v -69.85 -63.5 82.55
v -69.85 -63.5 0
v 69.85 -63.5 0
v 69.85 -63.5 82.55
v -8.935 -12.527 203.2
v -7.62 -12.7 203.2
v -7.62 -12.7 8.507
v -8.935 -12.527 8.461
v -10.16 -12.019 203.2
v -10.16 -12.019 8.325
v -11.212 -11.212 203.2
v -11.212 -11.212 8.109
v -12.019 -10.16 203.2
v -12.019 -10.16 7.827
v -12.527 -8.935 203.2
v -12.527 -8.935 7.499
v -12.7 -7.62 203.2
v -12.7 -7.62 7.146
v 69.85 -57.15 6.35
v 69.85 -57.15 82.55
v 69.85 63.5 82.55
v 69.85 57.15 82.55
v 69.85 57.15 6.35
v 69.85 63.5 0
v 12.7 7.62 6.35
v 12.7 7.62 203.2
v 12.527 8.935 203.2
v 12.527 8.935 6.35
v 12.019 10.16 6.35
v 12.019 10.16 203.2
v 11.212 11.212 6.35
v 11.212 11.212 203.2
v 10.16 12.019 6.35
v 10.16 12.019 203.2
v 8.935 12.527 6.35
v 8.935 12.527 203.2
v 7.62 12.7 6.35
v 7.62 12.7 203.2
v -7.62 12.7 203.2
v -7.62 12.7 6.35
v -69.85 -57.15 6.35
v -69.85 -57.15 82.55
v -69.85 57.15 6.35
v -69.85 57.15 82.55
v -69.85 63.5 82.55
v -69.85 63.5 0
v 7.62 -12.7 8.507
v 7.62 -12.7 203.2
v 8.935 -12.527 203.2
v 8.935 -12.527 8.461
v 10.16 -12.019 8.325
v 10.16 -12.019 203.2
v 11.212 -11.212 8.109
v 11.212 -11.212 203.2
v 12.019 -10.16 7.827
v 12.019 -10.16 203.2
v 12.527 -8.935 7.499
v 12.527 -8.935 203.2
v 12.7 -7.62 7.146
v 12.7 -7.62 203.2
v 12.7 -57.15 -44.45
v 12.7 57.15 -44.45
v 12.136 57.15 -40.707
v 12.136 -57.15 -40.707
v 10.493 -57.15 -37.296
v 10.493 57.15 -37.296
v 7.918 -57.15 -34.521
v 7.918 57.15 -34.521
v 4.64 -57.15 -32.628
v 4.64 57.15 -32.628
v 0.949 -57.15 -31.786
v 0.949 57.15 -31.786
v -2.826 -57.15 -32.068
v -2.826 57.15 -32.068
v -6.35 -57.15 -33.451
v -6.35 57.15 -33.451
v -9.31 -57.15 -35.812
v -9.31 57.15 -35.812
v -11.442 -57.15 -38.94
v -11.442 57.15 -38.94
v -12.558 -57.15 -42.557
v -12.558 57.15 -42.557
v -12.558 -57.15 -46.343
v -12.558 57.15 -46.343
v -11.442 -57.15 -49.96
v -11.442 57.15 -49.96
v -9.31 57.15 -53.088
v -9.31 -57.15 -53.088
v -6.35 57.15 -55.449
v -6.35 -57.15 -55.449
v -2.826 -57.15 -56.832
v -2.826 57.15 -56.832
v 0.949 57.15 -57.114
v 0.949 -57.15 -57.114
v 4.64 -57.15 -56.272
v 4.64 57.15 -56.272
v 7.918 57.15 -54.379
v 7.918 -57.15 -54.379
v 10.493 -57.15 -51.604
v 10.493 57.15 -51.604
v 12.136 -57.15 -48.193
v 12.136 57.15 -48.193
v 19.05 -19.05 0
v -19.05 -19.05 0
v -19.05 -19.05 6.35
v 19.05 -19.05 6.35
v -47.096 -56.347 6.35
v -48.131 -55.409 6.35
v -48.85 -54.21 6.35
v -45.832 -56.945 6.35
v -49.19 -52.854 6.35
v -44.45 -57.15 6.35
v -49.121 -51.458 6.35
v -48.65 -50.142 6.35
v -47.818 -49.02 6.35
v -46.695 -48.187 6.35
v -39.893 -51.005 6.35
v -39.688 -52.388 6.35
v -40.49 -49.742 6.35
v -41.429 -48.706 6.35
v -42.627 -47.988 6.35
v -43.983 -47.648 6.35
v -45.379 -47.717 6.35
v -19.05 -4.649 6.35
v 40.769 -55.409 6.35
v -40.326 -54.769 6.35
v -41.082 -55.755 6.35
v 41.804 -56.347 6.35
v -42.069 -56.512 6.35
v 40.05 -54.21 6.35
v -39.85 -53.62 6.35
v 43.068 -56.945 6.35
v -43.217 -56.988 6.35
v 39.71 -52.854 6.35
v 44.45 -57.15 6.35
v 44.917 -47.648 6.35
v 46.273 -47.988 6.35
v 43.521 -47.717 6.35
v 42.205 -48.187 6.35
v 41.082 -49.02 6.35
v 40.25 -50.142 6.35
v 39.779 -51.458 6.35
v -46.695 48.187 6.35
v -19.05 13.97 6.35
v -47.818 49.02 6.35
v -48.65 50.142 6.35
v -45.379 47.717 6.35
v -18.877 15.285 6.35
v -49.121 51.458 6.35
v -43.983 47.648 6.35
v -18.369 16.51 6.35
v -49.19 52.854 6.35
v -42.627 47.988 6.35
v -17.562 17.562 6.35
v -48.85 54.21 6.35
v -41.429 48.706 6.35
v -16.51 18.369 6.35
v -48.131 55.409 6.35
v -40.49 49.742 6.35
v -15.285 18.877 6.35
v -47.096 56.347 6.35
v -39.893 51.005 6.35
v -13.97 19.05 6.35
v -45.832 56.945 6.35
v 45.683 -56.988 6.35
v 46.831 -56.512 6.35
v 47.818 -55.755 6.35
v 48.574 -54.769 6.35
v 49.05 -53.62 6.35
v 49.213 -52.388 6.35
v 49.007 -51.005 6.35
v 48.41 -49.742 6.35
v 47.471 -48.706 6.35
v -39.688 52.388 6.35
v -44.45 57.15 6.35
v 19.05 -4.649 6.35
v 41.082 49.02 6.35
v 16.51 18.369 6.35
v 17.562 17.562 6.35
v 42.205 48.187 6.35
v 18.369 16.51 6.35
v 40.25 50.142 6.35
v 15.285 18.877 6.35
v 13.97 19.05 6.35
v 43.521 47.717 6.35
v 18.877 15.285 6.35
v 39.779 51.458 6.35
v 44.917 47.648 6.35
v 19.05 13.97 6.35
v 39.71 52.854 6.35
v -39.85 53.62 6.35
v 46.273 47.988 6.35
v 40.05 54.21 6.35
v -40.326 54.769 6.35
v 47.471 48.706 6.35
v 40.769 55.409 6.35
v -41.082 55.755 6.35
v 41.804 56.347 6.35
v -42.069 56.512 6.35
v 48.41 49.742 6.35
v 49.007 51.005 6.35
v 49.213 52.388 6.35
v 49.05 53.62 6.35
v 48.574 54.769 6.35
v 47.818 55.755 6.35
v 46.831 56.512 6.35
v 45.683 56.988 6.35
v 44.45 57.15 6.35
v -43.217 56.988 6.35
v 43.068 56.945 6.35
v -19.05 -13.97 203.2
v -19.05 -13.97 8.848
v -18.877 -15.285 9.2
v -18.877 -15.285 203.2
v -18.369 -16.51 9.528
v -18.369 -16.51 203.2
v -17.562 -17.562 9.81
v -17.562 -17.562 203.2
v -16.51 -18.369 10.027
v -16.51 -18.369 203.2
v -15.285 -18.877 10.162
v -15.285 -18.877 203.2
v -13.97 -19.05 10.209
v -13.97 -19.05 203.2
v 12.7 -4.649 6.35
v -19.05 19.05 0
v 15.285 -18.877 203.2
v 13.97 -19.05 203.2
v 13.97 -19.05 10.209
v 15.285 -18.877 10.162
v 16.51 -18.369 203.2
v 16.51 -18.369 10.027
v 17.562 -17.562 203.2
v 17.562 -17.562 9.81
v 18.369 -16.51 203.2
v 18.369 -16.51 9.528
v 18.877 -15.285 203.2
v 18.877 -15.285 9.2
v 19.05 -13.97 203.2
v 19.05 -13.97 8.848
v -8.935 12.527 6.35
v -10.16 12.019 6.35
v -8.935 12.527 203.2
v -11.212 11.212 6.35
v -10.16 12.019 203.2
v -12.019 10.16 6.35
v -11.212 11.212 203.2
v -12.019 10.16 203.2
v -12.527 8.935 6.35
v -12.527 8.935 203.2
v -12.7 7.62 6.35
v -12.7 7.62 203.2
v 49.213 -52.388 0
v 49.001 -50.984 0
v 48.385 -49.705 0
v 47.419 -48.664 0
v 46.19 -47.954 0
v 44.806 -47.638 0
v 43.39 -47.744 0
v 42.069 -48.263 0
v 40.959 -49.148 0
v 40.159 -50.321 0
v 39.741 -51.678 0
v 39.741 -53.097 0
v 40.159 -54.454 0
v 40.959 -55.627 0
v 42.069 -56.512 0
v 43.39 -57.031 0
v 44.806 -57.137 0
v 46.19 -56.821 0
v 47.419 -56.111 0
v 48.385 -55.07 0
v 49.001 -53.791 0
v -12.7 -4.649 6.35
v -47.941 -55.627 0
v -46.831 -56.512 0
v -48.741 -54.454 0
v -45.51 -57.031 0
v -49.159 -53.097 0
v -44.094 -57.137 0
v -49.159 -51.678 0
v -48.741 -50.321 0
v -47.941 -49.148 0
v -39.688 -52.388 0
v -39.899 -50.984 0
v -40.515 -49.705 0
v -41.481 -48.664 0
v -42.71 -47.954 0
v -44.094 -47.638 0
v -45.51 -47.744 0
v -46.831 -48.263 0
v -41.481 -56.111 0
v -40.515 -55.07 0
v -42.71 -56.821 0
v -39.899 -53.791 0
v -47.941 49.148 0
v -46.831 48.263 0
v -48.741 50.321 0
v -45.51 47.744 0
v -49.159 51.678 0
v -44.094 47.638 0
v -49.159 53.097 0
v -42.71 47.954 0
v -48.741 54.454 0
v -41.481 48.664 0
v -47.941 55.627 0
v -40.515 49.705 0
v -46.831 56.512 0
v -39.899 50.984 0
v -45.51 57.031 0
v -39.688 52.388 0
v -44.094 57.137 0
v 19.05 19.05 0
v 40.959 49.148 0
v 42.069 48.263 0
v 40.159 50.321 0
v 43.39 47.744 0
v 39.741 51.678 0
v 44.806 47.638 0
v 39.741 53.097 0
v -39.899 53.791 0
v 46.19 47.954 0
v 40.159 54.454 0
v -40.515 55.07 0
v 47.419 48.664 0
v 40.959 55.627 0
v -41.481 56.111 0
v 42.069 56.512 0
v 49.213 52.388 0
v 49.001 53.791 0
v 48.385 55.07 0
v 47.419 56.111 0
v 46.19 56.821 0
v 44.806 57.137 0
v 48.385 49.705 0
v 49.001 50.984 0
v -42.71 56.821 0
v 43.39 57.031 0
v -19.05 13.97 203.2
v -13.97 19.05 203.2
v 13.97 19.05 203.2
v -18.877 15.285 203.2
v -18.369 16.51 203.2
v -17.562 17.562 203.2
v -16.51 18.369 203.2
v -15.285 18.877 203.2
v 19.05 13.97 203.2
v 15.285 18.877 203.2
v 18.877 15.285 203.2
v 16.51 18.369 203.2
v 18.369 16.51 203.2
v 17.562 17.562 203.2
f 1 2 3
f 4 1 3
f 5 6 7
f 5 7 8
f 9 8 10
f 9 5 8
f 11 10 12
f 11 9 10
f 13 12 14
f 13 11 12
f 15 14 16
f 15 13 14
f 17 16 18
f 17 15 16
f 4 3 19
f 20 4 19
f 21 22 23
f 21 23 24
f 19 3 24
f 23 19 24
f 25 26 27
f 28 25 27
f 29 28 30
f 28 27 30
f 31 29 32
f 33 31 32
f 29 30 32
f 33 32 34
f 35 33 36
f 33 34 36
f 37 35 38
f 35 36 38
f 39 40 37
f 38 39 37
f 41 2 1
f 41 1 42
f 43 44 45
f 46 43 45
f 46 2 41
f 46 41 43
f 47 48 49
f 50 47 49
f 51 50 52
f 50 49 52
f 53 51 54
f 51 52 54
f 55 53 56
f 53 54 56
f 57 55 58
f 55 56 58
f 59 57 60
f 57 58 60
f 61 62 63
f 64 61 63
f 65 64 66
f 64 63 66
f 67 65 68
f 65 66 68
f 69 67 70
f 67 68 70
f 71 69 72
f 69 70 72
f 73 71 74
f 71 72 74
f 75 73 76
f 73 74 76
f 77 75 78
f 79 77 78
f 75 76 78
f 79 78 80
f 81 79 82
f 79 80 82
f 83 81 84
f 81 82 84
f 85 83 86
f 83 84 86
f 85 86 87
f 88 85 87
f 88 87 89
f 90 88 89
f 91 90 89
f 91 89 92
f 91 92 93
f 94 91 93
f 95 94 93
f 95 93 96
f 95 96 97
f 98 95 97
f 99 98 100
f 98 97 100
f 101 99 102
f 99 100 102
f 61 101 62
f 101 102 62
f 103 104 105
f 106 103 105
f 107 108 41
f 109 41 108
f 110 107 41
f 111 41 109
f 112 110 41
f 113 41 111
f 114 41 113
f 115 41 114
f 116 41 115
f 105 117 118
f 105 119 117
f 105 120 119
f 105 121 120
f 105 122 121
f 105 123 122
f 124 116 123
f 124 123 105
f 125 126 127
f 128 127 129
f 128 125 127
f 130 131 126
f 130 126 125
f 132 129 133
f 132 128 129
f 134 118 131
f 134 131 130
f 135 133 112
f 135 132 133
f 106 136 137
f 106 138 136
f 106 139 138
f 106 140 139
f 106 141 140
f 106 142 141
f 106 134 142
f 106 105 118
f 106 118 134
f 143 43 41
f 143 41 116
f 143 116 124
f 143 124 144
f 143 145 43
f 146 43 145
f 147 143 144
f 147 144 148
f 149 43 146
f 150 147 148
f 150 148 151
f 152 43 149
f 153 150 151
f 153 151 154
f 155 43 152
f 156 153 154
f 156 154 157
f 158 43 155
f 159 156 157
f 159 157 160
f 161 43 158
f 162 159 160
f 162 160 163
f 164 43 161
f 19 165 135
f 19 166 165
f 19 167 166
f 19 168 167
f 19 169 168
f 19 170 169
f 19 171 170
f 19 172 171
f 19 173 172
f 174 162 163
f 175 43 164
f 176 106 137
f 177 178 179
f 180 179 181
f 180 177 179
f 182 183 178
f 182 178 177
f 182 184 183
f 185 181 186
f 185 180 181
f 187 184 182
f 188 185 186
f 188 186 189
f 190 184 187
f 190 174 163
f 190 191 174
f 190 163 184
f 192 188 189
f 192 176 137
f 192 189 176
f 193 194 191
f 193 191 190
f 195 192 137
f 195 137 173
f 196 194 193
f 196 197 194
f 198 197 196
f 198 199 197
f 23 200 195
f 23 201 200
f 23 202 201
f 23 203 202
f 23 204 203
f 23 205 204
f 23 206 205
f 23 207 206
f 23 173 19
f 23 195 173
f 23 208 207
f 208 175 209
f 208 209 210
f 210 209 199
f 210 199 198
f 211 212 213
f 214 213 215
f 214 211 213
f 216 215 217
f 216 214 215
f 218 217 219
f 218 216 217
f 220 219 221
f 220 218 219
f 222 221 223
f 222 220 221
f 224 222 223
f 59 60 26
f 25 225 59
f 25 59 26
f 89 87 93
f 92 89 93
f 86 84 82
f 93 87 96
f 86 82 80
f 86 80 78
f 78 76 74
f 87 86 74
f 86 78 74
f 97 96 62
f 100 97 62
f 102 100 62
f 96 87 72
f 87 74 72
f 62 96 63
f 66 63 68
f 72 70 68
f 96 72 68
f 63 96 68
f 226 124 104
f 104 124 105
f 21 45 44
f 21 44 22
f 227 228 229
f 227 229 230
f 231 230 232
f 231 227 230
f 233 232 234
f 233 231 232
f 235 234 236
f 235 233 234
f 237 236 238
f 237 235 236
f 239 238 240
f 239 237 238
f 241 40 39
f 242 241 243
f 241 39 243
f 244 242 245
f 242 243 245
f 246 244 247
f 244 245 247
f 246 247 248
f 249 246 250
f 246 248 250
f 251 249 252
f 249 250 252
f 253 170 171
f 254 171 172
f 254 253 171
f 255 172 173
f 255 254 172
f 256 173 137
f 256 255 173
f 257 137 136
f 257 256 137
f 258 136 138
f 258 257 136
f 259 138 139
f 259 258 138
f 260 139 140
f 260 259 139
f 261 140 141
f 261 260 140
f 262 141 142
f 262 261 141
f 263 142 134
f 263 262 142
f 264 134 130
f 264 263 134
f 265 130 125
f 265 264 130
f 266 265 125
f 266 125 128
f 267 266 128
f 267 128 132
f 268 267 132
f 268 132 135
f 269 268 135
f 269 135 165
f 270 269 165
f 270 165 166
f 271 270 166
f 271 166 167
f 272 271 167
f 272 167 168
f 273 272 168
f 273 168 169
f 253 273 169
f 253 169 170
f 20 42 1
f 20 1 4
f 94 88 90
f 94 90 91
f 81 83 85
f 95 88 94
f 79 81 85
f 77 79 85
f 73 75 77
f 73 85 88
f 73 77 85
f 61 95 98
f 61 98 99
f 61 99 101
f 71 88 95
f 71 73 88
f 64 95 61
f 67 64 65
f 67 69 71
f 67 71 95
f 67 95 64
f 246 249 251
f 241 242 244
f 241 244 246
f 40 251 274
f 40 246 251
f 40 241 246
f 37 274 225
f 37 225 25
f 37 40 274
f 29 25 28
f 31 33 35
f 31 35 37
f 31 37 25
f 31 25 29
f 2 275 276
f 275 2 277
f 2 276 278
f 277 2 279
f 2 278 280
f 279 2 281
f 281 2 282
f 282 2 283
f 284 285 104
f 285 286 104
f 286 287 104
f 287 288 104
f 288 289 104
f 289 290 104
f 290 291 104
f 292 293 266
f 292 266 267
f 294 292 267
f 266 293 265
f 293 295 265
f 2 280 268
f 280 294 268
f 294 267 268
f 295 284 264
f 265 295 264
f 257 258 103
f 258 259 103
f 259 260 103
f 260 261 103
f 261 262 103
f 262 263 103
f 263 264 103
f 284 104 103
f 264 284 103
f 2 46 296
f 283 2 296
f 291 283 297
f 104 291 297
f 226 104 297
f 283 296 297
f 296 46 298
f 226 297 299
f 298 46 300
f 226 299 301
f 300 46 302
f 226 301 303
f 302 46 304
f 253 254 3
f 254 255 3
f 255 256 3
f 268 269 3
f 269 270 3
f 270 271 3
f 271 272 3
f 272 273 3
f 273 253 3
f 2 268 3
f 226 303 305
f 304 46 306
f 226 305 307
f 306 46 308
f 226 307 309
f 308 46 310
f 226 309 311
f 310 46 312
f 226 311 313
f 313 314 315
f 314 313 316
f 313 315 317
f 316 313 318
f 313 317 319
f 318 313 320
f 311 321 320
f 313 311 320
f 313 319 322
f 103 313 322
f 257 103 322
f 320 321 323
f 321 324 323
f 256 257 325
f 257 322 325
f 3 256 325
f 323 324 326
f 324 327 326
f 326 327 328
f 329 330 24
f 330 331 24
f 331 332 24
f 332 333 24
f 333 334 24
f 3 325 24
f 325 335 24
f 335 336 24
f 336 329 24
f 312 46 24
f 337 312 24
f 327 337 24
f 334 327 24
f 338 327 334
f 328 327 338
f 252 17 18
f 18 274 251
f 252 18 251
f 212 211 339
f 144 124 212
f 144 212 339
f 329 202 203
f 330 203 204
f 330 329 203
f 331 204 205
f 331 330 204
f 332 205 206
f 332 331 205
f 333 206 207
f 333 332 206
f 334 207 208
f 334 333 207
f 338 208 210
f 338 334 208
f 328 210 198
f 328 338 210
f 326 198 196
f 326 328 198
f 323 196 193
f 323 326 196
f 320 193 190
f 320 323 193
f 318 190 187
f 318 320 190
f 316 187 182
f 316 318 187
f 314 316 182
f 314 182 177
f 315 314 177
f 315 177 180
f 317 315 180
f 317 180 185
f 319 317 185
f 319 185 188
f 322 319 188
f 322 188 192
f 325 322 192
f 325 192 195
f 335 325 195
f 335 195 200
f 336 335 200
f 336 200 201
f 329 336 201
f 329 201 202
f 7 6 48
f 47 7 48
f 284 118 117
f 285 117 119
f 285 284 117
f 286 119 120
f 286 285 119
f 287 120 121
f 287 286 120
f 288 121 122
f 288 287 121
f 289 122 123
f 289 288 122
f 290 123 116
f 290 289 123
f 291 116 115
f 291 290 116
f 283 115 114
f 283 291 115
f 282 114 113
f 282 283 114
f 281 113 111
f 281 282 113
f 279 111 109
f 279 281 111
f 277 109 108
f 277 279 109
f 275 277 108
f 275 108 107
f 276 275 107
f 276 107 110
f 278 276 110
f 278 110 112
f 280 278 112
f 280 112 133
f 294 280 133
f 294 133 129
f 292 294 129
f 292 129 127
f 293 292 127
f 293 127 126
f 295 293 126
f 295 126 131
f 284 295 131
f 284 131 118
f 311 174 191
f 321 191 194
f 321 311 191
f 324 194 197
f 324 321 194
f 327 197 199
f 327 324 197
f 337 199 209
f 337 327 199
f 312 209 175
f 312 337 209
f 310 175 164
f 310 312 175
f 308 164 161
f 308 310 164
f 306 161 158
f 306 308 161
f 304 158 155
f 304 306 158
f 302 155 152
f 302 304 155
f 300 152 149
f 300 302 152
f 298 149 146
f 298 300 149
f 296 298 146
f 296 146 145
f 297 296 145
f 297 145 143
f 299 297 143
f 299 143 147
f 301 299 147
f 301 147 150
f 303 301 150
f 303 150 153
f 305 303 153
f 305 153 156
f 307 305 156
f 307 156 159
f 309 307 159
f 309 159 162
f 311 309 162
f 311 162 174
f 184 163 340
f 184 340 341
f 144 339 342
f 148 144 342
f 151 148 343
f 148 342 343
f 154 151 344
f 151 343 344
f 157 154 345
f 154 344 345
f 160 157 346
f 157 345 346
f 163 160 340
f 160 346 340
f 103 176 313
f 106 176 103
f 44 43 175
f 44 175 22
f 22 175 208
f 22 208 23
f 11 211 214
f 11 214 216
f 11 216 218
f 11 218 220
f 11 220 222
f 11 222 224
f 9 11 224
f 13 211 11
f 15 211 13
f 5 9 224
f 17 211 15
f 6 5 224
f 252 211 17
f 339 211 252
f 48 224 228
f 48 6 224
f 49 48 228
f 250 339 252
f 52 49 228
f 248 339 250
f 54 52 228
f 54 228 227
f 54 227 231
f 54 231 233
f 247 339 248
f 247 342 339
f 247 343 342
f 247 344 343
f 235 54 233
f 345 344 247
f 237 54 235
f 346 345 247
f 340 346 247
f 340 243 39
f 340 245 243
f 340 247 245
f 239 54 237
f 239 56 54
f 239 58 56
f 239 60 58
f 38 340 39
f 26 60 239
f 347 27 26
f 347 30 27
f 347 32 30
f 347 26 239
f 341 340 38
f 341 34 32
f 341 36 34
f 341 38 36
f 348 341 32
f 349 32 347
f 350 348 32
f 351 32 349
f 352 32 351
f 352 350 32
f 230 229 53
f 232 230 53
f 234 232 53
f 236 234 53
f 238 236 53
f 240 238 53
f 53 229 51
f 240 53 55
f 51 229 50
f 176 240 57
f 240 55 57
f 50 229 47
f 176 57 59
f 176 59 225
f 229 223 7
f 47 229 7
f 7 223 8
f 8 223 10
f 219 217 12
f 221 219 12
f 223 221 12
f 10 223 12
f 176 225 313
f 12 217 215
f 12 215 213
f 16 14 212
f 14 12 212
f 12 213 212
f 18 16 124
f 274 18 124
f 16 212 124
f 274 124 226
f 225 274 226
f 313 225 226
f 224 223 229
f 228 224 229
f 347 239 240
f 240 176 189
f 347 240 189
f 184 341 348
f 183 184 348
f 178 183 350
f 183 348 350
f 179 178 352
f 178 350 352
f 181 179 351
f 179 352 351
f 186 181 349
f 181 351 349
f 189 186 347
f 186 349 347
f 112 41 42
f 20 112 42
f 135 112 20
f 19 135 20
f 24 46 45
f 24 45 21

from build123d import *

# Parameters (mm, degrees)
F0_W      = 38.1
F0_H      = 38.1
F0_W_2    = 25.4
F0_H_2    = 25.4
F1_DEPTH  = 203.2
F2_R      = 5.08
F3_W      = 139.7
F3_H      = 127
F3_R      = 4.7625
F4_DEPTH  = 6.35
F6_W      = 139.7
F6_H      = 6.35
F7_DEPTH  = 76.2
F8_R      = 12.7
F9_DEPTH  = 114.3
F11_DEPTH = 38.1


with BuildPart() as f1:
    # F0 (on Top) → F1 (new body)
    with BuildSketch(Plane.XY):
        Rectangle(F0_W, F0_H)
        Rectangle(F0_W_2, F0_H_2, mode=Mode.SUBTRACT)
    extrude(amount=F1_DEPTH)

    # F2
    f2_edges = [f1.edges().sort_by_distance(p)[0] for p in [
        (-19.05, 19.05, 101.6),
        (-19.05, -19.05, 101.6),
        (19.05, -19.05, 101.6),
        (19.05, 19.05, 101.6),
        (-12.7, 12.7, 101.6),
        (12.7, 12.7, 101.6),
        (12.7, -12.7, 101.6),
        (-12.7, -12.7, 101.6),
    ]]
    fillet(f2_edges, radius=F2_R)

    # F3 (on Top) → F4 (join)
    with BuildSketch(Plane.XY):
        Rectangle(F3_W, F3_H)
        with Locations((-44.45, -52.3875)):
            Circle(F3_R, mode=Mode.SUBTRACT)
        with Locations((44.45, -52.3875)):
            Circle(F3_R, mode=Mode.SUBTRACT)
        with Locations((-44.45, 52.3875)):
            Circle(F3_R, mode=Mode.SUBTRACT)
        with Locations((44.45, 52.3875)):
            Circle(F3_R, mode=Mode.SUBTRACT)
    extrude(amount=F4_DEPTH)

    # F6 (on face) → F7 (join)
    with BuildSketch(Plane.XY.offset(6.35)):
        with Locations((0, 60.325)):
            Rectangle(F6_W, F6_H)
        with Locations((0, -60.325)):
            Rectangle(F6_W, F6_H)
    extrude(amount=F7_DEPTH)

    # F10 (on face) → F11 (cut, through all)
    with BuildSketch(Plane(origin=(-19.05, 0, 0), x_dir=(0, -1, 0), z_dir=(-1, 0, 0))):
        Polygon((19.05, 10.208864), (-19.05, 0), (19.05, 0), align=None)
    extrude(amount=-F11_DEPTH, mode=Mode.SUBTRACT)


with BuildPart() as f9:
    # F8 (on face) → F9 (new body, through all)
    with BuildSketch(Plane.XZ.offset(-57.15)):
        with Locations((0, -44.45)):
            Circle(F8_R)
    extrude(amount=F9_DEPTH)


solid = Compound([f1.part, f9.part])
